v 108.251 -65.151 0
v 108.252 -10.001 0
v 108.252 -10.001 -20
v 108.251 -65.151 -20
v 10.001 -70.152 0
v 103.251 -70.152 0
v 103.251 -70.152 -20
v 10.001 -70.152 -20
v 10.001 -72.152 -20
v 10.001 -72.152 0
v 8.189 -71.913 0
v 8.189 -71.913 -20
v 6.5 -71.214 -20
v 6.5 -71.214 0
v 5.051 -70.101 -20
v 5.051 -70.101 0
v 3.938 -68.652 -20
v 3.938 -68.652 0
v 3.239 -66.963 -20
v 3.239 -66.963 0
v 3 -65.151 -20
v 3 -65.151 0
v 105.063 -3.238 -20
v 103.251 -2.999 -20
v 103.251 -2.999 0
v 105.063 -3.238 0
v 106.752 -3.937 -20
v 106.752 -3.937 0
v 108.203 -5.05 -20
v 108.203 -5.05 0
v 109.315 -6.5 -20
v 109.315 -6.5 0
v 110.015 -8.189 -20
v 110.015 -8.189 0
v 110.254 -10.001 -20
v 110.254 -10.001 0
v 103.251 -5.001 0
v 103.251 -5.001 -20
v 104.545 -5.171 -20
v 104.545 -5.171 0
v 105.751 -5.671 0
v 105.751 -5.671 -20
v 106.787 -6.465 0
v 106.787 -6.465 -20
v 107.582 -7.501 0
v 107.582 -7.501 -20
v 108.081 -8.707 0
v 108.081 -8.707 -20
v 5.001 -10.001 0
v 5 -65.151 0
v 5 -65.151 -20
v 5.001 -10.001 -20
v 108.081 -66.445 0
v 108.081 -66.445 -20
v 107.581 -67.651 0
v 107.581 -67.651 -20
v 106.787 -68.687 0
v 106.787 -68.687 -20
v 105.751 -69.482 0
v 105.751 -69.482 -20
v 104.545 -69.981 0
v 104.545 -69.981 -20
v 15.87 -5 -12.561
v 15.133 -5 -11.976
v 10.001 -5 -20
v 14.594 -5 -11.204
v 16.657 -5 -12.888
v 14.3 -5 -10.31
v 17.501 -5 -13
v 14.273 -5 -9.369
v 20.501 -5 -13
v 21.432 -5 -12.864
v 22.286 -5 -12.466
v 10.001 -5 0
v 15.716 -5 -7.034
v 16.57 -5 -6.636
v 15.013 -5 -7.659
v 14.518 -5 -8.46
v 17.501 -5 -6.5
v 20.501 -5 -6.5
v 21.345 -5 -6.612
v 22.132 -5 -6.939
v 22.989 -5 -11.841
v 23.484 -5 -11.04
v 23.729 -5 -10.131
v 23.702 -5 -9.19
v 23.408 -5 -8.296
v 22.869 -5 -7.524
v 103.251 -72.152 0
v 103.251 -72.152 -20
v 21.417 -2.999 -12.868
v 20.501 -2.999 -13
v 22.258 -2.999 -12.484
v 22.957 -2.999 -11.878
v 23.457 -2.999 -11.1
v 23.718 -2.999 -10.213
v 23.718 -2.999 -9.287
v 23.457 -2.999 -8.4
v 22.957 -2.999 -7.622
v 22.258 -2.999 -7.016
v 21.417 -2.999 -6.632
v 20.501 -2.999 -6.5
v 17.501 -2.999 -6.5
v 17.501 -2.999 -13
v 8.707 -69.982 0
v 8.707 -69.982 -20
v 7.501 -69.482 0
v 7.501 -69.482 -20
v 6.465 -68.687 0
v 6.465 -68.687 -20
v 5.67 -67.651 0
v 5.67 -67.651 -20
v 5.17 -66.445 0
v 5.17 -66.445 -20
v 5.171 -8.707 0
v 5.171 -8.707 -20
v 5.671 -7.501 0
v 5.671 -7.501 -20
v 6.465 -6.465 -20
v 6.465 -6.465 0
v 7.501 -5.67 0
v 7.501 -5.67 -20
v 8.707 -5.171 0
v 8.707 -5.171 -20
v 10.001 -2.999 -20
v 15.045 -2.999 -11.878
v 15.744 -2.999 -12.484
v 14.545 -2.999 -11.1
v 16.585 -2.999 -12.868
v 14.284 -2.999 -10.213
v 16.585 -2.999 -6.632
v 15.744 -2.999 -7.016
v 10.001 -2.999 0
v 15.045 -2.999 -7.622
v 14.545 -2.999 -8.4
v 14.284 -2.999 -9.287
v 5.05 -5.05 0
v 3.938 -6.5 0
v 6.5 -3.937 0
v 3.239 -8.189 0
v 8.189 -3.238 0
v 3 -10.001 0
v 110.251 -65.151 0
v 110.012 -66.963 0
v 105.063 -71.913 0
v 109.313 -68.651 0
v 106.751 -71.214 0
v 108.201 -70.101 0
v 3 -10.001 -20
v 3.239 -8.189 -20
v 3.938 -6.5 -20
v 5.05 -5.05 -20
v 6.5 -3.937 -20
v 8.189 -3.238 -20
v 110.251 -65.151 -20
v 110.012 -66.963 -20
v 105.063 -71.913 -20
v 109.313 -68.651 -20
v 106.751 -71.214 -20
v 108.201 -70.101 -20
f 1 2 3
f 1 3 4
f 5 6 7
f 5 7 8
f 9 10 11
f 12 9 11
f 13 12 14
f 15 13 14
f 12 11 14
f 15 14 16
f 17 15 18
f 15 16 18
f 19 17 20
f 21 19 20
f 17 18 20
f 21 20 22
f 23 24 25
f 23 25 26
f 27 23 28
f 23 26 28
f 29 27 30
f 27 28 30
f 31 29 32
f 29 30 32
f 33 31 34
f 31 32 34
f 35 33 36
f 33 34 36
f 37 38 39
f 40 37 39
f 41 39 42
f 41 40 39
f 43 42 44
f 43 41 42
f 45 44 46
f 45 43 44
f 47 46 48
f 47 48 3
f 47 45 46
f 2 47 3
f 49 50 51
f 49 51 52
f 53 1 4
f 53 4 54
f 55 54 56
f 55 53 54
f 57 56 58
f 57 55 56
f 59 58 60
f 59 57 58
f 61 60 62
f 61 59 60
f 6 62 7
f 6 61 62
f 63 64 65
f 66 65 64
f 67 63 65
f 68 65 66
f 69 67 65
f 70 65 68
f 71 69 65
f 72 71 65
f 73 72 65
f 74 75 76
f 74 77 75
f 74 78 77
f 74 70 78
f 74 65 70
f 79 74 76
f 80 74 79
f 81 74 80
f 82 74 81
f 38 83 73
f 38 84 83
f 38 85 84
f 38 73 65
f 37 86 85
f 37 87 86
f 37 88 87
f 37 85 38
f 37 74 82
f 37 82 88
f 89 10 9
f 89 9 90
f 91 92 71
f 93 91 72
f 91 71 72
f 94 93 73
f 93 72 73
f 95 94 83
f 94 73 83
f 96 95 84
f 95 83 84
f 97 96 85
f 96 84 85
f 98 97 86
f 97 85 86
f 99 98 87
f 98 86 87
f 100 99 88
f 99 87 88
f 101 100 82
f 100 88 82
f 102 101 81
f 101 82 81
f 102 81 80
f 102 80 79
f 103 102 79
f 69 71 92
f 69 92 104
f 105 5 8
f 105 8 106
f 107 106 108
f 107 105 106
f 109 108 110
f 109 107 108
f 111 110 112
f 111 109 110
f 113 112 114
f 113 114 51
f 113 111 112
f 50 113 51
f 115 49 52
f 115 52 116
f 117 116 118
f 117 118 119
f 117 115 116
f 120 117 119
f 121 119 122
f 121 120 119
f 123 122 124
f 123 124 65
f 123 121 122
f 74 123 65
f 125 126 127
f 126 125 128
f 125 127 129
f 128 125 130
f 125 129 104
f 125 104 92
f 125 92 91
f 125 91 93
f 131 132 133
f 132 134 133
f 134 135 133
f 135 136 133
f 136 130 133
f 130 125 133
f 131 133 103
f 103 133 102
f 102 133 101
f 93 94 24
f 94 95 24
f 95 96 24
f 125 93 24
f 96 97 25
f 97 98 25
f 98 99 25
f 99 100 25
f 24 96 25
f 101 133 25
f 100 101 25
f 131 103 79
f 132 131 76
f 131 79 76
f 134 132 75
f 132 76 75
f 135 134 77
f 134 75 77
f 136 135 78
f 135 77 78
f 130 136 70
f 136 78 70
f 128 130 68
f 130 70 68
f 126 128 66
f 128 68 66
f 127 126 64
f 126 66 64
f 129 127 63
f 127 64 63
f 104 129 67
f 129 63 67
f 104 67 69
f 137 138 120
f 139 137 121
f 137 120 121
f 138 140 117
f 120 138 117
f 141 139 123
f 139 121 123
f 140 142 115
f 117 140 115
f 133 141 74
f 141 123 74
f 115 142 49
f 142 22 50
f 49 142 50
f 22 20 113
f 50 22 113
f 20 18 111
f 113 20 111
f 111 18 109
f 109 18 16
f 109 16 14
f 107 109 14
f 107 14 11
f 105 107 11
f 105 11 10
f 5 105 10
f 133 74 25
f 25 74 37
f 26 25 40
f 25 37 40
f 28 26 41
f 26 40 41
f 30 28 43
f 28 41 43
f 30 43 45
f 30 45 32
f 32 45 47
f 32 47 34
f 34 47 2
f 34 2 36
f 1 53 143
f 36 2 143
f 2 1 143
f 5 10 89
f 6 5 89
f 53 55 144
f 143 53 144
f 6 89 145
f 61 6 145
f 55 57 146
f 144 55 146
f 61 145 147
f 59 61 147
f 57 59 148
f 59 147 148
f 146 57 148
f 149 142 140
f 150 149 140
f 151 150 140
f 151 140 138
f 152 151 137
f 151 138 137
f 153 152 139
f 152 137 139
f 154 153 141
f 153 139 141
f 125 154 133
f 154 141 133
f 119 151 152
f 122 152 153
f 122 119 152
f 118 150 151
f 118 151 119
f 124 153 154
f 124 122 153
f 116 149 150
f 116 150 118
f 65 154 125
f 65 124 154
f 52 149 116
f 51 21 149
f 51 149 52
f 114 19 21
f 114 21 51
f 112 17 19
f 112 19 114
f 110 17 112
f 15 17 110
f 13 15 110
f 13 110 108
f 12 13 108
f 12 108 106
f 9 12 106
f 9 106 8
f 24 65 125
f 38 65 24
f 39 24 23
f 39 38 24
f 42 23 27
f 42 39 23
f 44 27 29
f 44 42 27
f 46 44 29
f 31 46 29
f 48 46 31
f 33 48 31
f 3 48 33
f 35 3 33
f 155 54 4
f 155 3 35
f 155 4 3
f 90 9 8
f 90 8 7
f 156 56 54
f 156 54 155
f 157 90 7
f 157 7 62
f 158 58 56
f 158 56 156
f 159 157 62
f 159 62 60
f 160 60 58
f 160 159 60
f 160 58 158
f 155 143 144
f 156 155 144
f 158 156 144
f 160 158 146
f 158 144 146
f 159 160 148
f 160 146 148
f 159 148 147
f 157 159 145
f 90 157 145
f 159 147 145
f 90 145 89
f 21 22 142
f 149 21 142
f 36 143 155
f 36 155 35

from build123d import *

# Parameters (mm, degrees)
EXTRUDE008_DEPTH = 10
EXTRUDE002_DEPTH = 20


with BuildPart() as extrude008:
    # Sketch006 (on Extrude) → Extrude008 (new body, symmetric)
    with BuildSketch(Plane.XZ):
        with BuildLine():
            ThreePointArc((20.501, -13), (23.751, -9.75), (20.501, -6.5))
            Line((20.501, -6.5), (17.501, -6.5))
            ThreePointArc((17.501, -6.5), (14.251, -9.75), (17.501, -13))
            Line((20.501, -13), (17.501, -13))
        make_face()
    extrude(amount=EXTRUDE008_DEPTH, both=True)


with BuildPart() as shell:
    # Sketch001 (on Sketch) → Extrude002 (new body)
    with BuildSketch(Plane(origin=(0, 0, 0), x_dir=(1, 0, 0), z_dir=(0, 0, -1))):
        with BuildLine():
            Line((3, 65.151), (3, 10.001))
            ThreePointArc((3, 10.001), (5.050485, 5.050192), (10.001, 2.999))
            Line((10.001, 2.999), (103.251, 2.999))
            ThreePointArc((103.251, 2.999), (108.202515, 5.049778), (110.254, 10.001))
            Line((110.251, 65.151), (110.254, 10.001))
            ThreePointArc((110.251, 65.151), (108.200808, 70.101101), (103.251, 72.152))
            Line((10.001, 72.152), (103.251, 72.152))
            ThreePointArc((10.001, 72.152), (5.050545, 70.101455), (3, 65.151))
        make_face()
        with BuildLine():
            Line((5, 65.151), (5.001, 10.001))
            ThreePointArc((5.001, 10.001), (6.465405, 6.465113), (10.001, 5))
            Line((10.001, 5), (103.251, 5.001))
            ThreePointArc((103.251, 5.001), (106.786887, 6.465405), (108.252, 10.001))
            Line((108.252, 10.001), (108.251, 65.151))
            ThreePointArc((108.251, 65.151), (106.786595, 68.686887), (103.251, 70.152))
            Line((103.251, 70.152), (10.001, 70.152))
            ThreePointArc((10.001, 70.152), (6.464759, 68.687241), (5, 65.151))
        make_face(mode=Mode.SUBTRACT)
    extrude(amount=EXTRUDE002_DEPTH)

    # Cut001: cut Extrude008
    add(extrude008.part, mode=Mode.SUBTRACT)


solid = shell.part
